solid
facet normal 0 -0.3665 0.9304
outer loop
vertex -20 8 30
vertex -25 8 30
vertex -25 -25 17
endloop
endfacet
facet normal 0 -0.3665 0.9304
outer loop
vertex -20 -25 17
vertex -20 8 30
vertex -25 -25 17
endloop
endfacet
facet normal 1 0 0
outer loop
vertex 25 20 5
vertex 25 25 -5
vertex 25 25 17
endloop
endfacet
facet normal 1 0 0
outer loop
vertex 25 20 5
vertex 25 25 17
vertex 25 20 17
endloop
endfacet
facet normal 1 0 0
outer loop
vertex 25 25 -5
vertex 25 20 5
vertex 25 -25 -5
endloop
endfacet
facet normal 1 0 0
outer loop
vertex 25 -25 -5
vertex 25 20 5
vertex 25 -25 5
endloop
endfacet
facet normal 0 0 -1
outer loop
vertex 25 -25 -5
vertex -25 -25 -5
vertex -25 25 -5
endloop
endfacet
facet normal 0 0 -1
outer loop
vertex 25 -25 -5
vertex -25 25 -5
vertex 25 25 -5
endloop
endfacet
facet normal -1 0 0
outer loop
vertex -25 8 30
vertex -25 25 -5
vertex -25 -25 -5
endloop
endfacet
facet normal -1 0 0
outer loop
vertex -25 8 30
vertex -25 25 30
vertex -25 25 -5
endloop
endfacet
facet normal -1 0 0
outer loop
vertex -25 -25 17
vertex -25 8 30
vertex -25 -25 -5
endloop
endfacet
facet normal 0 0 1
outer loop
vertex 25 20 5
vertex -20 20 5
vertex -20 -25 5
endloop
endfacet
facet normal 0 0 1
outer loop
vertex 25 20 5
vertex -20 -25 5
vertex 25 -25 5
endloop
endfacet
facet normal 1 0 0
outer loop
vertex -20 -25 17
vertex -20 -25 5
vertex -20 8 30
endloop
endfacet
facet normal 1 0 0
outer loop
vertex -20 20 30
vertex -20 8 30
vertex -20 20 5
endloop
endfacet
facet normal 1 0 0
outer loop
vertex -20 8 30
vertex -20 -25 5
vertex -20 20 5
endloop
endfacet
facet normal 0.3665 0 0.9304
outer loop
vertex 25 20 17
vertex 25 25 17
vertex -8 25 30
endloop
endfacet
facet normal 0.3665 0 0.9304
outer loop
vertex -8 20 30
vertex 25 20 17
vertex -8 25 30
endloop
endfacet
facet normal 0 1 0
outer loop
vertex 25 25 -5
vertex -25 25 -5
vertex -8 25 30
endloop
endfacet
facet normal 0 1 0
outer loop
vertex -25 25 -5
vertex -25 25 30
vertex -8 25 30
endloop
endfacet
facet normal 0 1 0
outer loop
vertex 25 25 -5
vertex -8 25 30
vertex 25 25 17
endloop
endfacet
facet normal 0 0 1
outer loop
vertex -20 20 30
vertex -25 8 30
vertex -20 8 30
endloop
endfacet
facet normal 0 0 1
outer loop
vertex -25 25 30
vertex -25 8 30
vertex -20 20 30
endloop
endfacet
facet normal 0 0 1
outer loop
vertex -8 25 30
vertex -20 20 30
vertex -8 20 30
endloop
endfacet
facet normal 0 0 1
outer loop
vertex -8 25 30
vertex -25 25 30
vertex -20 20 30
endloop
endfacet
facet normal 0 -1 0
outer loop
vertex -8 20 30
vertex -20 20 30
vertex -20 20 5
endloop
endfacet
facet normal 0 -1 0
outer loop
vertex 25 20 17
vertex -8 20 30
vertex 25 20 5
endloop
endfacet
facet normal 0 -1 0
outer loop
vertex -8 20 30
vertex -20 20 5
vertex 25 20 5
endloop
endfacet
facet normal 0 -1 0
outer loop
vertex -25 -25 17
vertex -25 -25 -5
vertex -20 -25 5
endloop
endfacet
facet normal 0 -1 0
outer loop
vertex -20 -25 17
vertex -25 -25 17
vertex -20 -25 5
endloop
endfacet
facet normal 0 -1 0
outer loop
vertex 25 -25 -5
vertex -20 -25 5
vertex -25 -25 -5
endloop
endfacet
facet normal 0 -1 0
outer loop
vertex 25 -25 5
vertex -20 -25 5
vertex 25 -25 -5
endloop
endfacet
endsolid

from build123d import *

# Parameters (mm, degrees)
F0_W      = 50
F0_H      = 50
F1_DEPTH  = 5
F2_W      = 50
F2_H      = 5
F3_DEPTH  = 25
F4_W      = 5
F4_H      = 45
F5_DEPTH  = 25
F7_DEPTH  = 5
F9_DEPTH  = 5
F10_W     = 50
F10_H     = 50
F11_DEPTH = 5


with BuildPart() as f1:
    # F0 (on Top) → F1 (new body)
    with BuildSketch(Plane.XY):
        Rectangle(F0_W, F0_H)
    extrude(amount=F1_DEPTH)

    # F2 (on face) → F3 (join)
    with BuildSketch(Plane.XY.offset(5)):
        with Locations((0, 22.5)):
            Rectangle(F2_W, F2_H)
    extrude(amount=F3_DEPTH)

    # F4 (on face) → F5 (join)
    with BuildSketch(Plane.XY.offset(5)):
        with Locations((-22.5, -2.5)):
            Rectangle(F4_W, F4_H)
    extrude(amount=F5_DEPTH)

    # F6 (on face) → F7 (cut)
    with BuildSketch(Plane(origin=(0, 25, 0), x_dir=(-1, 0, 0), z_dir=(0, 1, 0))):
        Polygon((-25, 30), (-25, 17), (8, 30), align=None)
    extrude(amount=-F7_DEPTH, mode=Mode.SUBTRACT)

    # F8 (on face) → F9 (cut)
    with BuildSketch(Plane(origin=(-25, 0, 0), x_dir=(0, -1, 0), z_dir=(-1, 0, 0))):
        Polygon((25, 30), (-8, 30), (25, 17), align=None)
    extrude(amount=-F9_DEPTH, mode=Mode.SUBTRACT)

    # F10 (on face) → F11 (join)
    with BuildSketch(Plane(origin=(0, 0, 0), x_dir=(1, 0, 0), z_dir=(0, 0, -1))):
        Rectangle(F10_W, F10_H)
    extrude(amount=F11_DEPTH)


solid = f1.part
